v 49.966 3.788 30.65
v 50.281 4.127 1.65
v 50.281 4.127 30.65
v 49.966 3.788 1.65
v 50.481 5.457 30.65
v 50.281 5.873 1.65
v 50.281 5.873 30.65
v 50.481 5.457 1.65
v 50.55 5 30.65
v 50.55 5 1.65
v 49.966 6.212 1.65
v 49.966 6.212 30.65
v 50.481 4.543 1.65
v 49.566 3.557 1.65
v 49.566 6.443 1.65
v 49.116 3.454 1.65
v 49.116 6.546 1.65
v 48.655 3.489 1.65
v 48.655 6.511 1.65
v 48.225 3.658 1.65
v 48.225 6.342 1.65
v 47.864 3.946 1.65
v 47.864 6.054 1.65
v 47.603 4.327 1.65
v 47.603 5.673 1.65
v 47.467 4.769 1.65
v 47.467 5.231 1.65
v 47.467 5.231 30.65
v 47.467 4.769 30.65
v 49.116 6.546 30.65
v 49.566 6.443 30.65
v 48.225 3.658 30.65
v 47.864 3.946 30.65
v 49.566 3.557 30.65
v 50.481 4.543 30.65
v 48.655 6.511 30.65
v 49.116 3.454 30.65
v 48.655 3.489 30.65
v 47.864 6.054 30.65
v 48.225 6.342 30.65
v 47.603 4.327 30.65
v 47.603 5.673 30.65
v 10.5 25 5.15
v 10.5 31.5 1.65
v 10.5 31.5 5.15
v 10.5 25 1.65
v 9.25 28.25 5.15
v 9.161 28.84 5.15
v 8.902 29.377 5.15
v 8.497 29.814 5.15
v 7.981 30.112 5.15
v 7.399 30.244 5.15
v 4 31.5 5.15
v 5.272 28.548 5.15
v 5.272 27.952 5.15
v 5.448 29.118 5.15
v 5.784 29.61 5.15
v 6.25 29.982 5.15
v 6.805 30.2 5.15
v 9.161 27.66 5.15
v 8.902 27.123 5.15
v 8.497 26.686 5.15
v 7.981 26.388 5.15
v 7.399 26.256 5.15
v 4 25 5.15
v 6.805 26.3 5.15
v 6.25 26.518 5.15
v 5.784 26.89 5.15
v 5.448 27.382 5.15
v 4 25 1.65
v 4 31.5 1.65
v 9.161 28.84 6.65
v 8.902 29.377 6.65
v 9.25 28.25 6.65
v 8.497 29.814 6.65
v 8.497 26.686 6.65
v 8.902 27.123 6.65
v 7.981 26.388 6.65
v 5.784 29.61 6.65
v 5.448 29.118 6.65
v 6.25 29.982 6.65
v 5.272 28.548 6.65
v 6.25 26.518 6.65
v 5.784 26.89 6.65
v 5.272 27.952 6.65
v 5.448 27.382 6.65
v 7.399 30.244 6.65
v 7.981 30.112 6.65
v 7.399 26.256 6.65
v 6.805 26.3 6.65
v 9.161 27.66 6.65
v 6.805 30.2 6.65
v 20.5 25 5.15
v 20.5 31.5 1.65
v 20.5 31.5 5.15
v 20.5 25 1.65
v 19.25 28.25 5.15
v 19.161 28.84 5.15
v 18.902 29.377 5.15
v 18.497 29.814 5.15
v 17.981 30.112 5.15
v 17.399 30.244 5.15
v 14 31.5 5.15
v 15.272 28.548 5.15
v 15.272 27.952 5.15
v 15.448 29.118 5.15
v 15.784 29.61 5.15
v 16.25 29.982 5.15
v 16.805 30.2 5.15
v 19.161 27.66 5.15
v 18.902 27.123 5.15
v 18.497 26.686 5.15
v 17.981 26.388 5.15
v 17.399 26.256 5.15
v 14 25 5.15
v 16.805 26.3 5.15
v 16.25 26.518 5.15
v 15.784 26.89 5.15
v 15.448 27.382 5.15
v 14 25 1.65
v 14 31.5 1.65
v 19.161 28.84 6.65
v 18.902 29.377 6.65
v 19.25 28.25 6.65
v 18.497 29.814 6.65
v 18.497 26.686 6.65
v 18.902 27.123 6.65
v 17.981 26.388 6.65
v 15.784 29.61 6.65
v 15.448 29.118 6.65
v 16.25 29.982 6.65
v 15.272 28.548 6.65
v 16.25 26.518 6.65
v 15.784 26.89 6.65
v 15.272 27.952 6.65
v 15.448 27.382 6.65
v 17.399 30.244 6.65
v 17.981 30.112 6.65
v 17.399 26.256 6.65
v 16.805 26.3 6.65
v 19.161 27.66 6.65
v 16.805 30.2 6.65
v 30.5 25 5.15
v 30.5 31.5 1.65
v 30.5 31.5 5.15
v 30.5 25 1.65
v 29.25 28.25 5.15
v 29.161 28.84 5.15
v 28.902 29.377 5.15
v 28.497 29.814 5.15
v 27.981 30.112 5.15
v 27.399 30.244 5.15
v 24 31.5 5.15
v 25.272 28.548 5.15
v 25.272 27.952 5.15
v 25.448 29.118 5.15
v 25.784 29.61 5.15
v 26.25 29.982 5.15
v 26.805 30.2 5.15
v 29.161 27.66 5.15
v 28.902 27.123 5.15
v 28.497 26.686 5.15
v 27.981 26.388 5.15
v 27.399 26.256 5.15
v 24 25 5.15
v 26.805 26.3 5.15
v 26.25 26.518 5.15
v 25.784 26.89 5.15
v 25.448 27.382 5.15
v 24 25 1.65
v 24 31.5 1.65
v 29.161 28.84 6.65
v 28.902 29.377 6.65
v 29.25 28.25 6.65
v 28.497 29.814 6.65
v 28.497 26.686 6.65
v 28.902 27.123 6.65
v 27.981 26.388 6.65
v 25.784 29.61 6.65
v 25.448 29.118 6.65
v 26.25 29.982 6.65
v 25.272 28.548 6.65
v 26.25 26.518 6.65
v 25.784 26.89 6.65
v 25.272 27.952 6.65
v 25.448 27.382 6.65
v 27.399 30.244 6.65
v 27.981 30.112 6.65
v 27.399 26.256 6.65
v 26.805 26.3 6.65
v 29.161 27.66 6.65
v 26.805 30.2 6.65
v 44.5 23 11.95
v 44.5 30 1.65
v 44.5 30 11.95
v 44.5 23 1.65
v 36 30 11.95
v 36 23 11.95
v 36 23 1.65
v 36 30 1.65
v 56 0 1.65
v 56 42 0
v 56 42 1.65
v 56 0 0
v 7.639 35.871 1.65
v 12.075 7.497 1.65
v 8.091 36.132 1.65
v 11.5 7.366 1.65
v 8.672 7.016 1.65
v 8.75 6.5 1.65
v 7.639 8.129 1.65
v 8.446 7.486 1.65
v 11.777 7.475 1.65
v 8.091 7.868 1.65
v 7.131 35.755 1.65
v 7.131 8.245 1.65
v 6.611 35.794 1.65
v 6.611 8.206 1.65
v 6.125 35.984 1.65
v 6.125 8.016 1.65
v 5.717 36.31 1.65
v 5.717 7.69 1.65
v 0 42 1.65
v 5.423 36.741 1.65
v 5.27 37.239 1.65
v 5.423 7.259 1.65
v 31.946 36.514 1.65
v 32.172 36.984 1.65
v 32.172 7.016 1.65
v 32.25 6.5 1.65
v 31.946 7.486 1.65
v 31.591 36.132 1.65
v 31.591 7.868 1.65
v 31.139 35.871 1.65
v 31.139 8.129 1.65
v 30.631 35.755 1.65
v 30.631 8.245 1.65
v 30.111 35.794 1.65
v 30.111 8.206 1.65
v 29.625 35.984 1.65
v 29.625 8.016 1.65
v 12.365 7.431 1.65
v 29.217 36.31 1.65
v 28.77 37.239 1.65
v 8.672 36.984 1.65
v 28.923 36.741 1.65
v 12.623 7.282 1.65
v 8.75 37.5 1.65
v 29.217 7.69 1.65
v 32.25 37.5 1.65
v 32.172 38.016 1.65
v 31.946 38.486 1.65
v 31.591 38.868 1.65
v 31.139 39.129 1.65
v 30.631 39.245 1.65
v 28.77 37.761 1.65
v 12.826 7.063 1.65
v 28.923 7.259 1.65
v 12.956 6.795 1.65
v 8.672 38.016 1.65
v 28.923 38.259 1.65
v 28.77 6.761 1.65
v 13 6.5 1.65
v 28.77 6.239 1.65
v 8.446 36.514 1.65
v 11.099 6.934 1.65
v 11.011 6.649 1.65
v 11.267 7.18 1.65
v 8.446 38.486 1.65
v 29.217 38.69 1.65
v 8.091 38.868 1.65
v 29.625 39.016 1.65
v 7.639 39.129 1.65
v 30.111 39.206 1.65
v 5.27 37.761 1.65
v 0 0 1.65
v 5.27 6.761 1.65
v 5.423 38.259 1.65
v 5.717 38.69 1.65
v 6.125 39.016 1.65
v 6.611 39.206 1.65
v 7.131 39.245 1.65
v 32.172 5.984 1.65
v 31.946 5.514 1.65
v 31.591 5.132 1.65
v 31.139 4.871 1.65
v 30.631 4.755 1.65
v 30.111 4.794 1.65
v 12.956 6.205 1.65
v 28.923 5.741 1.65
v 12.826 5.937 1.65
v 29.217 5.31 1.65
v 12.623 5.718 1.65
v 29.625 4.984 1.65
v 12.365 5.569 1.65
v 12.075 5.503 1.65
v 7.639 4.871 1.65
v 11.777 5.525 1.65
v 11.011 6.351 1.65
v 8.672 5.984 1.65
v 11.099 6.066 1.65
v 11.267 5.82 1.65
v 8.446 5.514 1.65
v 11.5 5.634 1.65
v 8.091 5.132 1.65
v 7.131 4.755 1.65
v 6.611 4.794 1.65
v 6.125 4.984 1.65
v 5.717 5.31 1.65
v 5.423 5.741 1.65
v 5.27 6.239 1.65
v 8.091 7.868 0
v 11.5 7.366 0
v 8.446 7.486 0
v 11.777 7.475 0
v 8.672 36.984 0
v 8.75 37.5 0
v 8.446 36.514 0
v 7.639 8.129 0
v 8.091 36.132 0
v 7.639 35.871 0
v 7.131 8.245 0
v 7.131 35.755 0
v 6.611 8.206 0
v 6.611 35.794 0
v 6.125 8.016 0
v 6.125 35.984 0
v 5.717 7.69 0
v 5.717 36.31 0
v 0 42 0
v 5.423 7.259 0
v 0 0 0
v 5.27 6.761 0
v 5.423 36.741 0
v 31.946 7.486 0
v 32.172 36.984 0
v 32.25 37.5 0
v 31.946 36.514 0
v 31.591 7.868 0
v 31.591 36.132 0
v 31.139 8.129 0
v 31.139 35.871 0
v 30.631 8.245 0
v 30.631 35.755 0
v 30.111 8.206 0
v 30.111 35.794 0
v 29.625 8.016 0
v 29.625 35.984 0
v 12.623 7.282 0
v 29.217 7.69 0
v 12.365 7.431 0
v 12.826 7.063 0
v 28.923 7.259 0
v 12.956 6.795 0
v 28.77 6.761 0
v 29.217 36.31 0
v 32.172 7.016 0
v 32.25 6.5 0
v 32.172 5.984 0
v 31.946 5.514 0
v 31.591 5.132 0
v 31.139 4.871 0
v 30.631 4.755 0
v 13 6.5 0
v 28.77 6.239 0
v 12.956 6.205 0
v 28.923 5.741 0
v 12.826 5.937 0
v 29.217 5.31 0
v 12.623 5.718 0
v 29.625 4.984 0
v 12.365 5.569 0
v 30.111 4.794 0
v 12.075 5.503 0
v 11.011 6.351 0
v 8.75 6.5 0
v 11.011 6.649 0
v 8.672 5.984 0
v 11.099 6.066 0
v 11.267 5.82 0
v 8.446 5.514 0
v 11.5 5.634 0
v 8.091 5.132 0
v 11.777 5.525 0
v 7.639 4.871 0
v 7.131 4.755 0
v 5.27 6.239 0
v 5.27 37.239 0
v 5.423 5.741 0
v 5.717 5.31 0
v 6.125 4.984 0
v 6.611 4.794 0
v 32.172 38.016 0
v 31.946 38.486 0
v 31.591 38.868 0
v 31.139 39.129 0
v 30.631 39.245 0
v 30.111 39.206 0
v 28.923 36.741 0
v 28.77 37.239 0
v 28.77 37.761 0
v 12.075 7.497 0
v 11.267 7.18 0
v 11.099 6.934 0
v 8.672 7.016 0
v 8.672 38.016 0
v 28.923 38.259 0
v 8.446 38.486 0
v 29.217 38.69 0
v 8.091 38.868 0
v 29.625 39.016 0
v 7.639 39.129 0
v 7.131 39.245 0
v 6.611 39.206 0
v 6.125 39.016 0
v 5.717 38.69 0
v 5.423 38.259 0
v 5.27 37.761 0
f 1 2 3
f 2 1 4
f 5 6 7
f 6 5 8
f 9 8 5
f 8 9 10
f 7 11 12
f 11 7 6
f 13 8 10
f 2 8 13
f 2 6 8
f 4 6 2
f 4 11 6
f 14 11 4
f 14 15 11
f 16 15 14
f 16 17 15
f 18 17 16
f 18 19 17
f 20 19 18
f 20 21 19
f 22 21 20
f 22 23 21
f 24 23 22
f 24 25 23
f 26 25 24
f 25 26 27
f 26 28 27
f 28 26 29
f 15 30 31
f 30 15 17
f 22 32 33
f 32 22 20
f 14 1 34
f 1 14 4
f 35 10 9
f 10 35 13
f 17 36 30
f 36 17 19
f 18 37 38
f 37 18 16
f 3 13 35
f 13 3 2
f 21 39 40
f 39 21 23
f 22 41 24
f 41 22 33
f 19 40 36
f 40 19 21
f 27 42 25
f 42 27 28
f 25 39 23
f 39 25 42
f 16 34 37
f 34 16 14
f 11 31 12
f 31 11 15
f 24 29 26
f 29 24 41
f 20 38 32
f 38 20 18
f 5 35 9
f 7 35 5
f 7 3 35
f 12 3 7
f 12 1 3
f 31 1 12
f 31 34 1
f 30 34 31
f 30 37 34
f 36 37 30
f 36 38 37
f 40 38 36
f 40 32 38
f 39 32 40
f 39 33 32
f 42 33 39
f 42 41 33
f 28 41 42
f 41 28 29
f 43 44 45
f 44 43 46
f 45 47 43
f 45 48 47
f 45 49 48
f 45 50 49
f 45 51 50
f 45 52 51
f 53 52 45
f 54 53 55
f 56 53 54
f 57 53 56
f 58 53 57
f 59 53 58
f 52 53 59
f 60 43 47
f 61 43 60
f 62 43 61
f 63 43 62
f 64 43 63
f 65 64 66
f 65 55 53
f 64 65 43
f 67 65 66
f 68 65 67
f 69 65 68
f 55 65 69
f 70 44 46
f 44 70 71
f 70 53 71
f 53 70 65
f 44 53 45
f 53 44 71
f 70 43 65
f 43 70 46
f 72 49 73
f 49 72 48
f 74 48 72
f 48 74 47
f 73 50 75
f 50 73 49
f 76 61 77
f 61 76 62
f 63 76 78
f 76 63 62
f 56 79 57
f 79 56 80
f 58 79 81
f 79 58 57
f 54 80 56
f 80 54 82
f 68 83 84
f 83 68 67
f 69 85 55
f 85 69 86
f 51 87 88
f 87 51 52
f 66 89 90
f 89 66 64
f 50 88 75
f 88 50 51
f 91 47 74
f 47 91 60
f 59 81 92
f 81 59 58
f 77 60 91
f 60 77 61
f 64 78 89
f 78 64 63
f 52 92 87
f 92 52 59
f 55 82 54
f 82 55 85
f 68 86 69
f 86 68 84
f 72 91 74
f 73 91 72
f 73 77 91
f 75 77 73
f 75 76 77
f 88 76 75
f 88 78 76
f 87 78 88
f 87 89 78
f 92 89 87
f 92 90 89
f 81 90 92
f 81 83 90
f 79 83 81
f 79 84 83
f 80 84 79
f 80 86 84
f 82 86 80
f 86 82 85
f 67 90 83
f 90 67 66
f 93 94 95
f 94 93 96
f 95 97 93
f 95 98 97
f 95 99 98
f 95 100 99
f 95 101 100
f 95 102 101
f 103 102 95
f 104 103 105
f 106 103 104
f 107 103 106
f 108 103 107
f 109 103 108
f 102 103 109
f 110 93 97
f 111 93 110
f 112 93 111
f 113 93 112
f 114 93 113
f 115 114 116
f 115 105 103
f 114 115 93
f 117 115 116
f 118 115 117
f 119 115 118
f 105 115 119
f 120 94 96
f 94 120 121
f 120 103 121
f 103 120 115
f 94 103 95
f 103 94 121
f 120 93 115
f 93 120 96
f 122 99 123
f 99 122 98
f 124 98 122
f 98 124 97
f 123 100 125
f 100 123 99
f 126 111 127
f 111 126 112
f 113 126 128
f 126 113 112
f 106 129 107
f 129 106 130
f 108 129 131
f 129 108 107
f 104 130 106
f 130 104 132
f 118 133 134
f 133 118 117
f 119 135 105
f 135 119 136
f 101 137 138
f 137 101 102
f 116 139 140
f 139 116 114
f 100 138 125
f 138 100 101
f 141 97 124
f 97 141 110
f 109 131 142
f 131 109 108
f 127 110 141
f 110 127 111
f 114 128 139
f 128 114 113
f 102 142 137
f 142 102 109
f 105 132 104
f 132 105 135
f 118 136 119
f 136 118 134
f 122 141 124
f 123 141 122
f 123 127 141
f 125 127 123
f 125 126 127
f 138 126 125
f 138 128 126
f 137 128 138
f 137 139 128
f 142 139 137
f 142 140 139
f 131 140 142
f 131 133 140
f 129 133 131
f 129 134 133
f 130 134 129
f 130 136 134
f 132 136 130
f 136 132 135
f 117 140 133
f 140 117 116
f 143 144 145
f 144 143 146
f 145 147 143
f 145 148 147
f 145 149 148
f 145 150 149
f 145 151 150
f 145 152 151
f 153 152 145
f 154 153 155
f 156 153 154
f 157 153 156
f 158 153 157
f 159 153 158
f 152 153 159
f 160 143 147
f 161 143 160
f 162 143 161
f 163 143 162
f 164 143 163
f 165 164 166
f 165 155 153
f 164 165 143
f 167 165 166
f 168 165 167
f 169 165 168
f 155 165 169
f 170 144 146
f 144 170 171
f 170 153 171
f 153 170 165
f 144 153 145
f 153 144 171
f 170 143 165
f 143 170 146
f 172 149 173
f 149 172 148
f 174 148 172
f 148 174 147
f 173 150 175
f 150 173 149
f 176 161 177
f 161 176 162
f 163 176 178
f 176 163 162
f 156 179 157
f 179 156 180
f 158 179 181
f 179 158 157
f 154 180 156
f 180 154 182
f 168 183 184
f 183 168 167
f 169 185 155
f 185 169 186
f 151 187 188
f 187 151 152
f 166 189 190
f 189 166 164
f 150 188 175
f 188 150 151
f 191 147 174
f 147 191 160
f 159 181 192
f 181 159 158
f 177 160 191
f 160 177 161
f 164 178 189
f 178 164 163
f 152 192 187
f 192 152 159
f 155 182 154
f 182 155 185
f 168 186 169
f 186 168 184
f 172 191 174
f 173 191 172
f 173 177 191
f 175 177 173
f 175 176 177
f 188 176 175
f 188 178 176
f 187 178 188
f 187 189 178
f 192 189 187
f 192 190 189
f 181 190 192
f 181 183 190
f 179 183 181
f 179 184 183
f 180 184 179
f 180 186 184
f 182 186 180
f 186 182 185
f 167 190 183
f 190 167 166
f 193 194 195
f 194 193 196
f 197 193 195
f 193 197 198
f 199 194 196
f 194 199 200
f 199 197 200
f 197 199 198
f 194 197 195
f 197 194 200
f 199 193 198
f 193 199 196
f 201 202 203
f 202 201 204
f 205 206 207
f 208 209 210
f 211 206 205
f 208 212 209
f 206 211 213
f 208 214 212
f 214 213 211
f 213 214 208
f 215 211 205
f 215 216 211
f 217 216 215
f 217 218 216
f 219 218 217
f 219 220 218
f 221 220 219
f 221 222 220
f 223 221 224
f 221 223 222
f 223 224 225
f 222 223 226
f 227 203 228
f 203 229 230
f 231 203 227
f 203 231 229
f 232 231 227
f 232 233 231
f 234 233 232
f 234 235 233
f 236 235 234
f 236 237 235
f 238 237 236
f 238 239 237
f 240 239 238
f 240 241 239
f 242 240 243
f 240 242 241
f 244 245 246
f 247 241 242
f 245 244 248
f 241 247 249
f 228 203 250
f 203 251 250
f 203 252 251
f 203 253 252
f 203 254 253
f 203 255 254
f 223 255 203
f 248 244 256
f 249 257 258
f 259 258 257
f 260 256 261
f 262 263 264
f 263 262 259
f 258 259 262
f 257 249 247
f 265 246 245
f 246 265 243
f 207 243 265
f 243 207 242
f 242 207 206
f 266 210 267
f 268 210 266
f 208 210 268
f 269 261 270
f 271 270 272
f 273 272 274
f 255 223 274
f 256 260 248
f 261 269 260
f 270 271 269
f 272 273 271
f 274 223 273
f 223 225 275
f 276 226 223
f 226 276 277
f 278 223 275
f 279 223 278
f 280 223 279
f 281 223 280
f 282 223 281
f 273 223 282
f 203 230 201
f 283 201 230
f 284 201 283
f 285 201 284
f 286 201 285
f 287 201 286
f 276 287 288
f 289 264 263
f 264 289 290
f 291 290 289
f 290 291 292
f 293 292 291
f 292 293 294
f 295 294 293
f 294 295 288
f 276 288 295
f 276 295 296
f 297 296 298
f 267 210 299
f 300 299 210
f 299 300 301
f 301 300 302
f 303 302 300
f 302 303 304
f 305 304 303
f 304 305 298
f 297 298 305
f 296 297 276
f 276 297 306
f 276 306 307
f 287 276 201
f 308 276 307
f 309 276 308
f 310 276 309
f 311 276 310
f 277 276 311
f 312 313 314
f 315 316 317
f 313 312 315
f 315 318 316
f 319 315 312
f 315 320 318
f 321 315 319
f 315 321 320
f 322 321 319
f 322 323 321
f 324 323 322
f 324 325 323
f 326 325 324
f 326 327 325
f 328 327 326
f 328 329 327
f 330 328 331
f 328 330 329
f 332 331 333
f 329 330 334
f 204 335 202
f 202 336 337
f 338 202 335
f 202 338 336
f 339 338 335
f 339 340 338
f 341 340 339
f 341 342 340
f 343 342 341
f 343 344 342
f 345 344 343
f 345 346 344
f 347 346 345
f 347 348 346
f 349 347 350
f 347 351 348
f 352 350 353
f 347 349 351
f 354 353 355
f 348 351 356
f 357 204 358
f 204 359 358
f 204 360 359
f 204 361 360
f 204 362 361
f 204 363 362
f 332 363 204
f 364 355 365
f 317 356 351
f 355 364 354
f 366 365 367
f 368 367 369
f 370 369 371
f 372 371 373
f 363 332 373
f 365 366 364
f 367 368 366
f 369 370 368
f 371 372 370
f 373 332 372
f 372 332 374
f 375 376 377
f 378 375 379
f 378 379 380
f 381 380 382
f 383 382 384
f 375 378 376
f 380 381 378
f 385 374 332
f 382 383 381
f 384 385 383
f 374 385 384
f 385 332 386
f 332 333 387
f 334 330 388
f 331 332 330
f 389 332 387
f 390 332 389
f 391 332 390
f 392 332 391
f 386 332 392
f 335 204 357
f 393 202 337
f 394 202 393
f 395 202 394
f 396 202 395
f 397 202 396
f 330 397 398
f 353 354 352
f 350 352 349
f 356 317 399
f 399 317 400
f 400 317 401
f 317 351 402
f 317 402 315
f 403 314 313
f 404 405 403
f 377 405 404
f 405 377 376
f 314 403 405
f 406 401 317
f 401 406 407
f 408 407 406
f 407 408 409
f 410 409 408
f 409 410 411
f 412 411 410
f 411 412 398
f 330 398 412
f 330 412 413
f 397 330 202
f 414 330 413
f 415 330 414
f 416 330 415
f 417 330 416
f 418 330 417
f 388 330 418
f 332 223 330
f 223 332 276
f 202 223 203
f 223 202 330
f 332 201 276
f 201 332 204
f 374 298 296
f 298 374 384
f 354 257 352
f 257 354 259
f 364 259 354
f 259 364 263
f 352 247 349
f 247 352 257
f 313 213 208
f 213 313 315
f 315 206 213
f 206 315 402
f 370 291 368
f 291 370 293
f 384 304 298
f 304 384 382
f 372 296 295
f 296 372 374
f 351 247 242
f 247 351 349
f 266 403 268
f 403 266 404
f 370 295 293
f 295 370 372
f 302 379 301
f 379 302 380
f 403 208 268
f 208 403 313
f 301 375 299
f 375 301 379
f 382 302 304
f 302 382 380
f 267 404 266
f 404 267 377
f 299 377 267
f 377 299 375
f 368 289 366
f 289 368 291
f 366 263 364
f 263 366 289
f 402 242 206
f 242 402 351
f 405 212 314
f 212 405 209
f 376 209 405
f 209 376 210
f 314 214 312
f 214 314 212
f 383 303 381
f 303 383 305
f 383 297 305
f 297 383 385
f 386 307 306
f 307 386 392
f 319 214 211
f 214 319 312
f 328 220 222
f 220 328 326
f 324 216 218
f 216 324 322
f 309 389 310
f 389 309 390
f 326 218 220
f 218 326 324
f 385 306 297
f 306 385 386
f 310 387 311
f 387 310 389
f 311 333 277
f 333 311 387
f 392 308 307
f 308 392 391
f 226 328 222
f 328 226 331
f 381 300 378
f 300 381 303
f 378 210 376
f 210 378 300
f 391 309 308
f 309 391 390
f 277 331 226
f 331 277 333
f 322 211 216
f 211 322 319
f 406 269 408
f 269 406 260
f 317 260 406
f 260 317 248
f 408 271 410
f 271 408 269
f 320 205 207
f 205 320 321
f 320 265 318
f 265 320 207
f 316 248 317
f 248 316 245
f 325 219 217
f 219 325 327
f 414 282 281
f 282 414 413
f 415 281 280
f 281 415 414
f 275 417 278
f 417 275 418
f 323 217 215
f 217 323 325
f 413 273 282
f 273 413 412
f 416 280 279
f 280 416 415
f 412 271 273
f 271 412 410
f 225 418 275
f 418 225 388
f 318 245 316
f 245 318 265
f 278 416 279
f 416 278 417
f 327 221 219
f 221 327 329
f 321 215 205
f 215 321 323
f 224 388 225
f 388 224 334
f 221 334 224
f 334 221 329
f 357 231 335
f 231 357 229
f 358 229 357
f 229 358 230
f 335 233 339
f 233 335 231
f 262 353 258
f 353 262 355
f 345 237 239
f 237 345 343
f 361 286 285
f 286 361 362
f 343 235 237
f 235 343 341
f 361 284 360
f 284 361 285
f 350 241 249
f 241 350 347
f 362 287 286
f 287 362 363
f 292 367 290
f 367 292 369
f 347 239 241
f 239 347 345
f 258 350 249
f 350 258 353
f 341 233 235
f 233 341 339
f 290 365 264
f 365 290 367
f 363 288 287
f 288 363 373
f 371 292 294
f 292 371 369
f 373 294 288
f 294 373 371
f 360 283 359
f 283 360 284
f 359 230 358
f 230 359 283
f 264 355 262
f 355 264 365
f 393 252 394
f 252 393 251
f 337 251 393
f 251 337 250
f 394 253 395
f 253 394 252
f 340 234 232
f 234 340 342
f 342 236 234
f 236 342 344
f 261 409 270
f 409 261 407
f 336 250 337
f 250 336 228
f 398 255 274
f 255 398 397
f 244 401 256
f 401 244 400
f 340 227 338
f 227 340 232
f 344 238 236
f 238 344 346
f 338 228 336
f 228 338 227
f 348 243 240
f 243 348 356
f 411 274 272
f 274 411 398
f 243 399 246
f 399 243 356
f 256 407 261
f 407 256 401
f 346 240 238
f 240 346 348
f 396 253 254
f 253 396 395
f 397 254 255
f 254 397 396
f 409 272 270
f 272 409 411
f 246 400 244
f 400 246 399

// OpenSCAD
pcb_h=1.65;

function receiver_pcb_height_total() = pcb_h + 10.3;

receiver_pcb();

module receiver_pcb()
{
    difference()
    {
        union()
        {
            pcb();

            translate([0,0,pcb_h])
            {
                ir_sensor();
                led();
                buttons();
            }
        }
            translate([7,6.5,0])
            spacers_holes();
    }
}

module pcb()
{
    cube([56,42,pcb_h]);
}

module spacers_holes()
{
    translate([5,0,0])
    spacer_hole(d=2);

    translate([0,0,0])
    spacer_hole();
    translate([0,31,0])
    spacer_hole();
    translate([23.5,0,0])
    spacer_hole();
    translate([23.5,31,0])
    spacer_hole();
}

module spacer_hole(d=3.5)
{
    cylinder(d=d,h=pcb_h,$fn=21);
}

module ir_sensor()
{
    translate([36,23,0])
    cube([8.5,7,10.3]);
}

module led()
{
    translate([49,5,0])
    cylinder(d=3.1,h=9,$fn=21);
    translate([49,5,9])
    cylinder(d=3.1,h=20,$fn=21);
}

module buttons()
{
    translate([4,25,0])
    button();
    translate([14,25,0])
    button();
    translate([24,25,0])
    button();
}

module button()
{
    cube([6.5,6.5,3.5]);
    translate([6.5/2,6.5/2,0])
    cylinder(d=4,h=5,$fn=21);
    
//    translate([6.5/2,6.5/2,0])
//    #cylinder(d=4,h=20,$fn=21);    
}
